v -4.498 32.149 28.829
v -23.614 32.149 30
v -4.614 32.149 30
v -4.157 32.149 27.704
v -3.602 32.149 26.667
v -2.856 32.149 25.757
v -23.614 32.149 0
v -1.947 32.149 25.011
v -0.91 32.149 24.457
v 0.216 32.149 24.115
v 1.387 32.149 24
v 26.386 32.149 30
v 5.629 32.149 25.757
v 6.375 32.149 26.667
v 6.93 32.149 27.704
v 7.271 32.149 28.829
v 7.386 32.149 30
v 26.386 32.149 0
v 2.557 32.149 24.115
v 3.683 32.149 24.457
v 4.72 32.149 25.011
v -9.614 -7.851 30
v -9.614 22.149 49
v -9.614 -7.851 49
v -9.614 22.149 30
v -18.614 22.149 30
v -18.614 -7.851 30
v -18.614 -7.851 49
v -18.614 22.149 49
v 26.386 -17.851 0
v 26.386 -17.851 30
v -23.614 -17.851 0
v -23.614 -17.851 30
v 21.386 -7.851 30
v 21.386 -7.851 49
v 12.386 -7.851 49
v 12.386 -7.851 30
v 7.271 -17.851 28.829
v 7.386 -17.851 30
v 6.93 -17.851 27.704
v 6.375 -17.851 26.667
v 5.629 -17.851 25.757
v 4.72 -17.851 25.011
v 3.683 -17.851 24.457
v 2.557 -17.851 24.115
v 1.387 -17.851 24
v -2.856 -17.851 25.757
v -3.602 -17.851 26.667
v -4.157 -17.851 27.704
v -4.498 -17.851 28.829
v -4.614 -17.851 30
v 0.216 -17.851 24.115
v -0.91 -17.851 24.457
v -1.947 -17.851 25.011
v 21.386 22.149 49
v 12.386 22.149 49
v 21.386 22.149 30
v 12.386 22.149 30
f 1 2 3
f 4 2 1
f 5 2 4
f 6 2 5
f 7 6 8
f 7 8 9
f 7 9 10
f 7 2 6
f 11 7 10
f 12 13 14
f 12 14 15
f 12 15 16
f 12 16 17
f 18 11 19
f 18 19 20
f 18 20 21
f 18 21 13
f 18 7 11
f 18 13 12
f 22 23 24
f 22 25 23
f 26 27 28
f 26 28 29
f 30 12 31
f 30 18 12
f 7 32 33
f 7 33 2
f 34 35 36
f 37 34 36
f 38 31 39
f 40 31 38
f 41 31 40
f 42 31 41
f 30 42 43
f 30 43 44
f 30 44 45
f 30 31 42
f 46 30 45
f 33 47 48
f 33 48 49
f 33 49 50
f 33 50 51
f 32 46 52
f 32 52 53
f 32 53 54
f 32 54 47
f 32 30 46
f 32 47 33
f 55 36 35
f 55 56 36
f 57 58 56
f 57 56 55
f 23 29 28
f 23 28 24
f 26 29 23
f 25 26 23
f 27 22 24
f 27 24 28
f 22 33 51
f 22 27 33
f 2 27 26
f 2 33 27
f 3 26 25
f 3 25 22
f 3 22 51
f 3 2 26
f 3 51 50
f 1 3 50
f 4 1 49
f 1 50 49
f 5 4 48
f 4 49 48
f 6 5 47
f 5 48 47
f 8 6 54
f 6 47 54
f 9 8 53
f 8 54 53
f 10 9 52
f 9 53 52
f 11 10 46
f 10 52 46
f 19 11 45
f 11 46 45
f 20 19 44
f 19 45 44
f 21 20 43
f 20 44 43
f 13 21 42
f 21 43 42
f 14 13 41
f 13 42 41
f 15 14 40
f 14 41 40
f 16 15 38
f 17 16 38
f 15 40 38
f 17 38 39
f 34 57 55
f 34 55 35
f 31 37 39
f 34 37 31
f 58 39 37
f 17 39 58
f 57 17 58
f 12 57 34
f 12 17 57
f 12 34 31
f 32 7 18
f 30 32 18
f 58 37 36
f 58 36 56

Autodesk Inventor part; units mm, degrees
ref_plane "YZ Plane" through (0, 0, 0) normal (1, 0, 0) x (0, 1, 0)
ref_plane "XZ Plane" through (0, 0, 0) normal (0, 1, 0) x (-1, 0, 0)
ref_plane "XY Plane" through (0, 0, 0) normal (0, 0, 1) x (1, 0, 0)
sketch "Sketch1" plane through (0, 0, 0) normal (0, 0, 1) x (1, 0, 0)
  line L0 (-23.6135, 32.149) -> (26.3865, 32.149)
  line L1 (26.3865, 32.149) -> (26.3865, -17.851)
  line L2 (26.3865, -17.851) -> (-23.6135, -17.851)
  line L3 (-23.6135, -17.851) -> (-23.6135, 32.149)
  point P0 (0, 0)
  dimension "d0" = 50
  dimension "d1" = 50
extrude "Extrusion1" add sketch "Sketch1" along normal blind 30
sketch "Sketch2" plane through (0, 0, 30) normal (0, 0, 1) x (1, 0, 0)
  line L0 (12.3865, 22.149) -> (21.3865, 22.149)
  line L1 (21.3865, 22.149) -> (21.3865, -7.851)
  line L2 (21.3865, -7.851) -> (12.3865, -7.851)
  line L3 (12.3865, -7.851) -> (12.3865, 22.149)
  line L4 (-18.6135, 22.149) -> (-9.6135, 22.149)
  line L5 (-9.6135, 22.149) -> (-9.6135, -7.851)
  line L6 (-9.6135, -7.851) -> (-18.6135, -7.851)
  line L7 (-18.6135, -7.851) -> (-18.6135, 22.149)
  line L8 (26.3865, 32.149) -> (-23.6135, 32.149) projected
  line L9 (-23.6135, -17.851) -> (26.3865, -17.851) projected
  line L10 (26.3865, -17.851) -> (26.3865, 32.149) projected
  line L11 (-23.6135, 32.149) -> (-23.6135, -17.851) projected
  point P0 (0, 0)
  dimension "d4" = 10
  dimension "d5" = 10
  dimension "d6" = 5
  dimension "d7" = 5
  dimension "d11" = 9
  dimension "d12" = 9
sketch "Sketch3" plane through (-23.6135, -17.851, 0) normal (0, -1, 0) x (1, 0, 0)
  line L0 (0, 30) -> (50, 30) projected
  circle A0 centre (25, 30) radius 6
  point P0 (23.6135, 0)
  dimension "d8" = 12
  dimension "d13" = 25
extrude "Extrusion2" cut sketch "Sketch3" against normal blind 50
extrude "Extrusion3" add sketch "Sketch2" along normal blind 19 contours L0 L1 L2 L3 | L4 L5 L6 L7
equation "\"d1\" = d0"
properties part number "laser top" material "Iron, Cast"
